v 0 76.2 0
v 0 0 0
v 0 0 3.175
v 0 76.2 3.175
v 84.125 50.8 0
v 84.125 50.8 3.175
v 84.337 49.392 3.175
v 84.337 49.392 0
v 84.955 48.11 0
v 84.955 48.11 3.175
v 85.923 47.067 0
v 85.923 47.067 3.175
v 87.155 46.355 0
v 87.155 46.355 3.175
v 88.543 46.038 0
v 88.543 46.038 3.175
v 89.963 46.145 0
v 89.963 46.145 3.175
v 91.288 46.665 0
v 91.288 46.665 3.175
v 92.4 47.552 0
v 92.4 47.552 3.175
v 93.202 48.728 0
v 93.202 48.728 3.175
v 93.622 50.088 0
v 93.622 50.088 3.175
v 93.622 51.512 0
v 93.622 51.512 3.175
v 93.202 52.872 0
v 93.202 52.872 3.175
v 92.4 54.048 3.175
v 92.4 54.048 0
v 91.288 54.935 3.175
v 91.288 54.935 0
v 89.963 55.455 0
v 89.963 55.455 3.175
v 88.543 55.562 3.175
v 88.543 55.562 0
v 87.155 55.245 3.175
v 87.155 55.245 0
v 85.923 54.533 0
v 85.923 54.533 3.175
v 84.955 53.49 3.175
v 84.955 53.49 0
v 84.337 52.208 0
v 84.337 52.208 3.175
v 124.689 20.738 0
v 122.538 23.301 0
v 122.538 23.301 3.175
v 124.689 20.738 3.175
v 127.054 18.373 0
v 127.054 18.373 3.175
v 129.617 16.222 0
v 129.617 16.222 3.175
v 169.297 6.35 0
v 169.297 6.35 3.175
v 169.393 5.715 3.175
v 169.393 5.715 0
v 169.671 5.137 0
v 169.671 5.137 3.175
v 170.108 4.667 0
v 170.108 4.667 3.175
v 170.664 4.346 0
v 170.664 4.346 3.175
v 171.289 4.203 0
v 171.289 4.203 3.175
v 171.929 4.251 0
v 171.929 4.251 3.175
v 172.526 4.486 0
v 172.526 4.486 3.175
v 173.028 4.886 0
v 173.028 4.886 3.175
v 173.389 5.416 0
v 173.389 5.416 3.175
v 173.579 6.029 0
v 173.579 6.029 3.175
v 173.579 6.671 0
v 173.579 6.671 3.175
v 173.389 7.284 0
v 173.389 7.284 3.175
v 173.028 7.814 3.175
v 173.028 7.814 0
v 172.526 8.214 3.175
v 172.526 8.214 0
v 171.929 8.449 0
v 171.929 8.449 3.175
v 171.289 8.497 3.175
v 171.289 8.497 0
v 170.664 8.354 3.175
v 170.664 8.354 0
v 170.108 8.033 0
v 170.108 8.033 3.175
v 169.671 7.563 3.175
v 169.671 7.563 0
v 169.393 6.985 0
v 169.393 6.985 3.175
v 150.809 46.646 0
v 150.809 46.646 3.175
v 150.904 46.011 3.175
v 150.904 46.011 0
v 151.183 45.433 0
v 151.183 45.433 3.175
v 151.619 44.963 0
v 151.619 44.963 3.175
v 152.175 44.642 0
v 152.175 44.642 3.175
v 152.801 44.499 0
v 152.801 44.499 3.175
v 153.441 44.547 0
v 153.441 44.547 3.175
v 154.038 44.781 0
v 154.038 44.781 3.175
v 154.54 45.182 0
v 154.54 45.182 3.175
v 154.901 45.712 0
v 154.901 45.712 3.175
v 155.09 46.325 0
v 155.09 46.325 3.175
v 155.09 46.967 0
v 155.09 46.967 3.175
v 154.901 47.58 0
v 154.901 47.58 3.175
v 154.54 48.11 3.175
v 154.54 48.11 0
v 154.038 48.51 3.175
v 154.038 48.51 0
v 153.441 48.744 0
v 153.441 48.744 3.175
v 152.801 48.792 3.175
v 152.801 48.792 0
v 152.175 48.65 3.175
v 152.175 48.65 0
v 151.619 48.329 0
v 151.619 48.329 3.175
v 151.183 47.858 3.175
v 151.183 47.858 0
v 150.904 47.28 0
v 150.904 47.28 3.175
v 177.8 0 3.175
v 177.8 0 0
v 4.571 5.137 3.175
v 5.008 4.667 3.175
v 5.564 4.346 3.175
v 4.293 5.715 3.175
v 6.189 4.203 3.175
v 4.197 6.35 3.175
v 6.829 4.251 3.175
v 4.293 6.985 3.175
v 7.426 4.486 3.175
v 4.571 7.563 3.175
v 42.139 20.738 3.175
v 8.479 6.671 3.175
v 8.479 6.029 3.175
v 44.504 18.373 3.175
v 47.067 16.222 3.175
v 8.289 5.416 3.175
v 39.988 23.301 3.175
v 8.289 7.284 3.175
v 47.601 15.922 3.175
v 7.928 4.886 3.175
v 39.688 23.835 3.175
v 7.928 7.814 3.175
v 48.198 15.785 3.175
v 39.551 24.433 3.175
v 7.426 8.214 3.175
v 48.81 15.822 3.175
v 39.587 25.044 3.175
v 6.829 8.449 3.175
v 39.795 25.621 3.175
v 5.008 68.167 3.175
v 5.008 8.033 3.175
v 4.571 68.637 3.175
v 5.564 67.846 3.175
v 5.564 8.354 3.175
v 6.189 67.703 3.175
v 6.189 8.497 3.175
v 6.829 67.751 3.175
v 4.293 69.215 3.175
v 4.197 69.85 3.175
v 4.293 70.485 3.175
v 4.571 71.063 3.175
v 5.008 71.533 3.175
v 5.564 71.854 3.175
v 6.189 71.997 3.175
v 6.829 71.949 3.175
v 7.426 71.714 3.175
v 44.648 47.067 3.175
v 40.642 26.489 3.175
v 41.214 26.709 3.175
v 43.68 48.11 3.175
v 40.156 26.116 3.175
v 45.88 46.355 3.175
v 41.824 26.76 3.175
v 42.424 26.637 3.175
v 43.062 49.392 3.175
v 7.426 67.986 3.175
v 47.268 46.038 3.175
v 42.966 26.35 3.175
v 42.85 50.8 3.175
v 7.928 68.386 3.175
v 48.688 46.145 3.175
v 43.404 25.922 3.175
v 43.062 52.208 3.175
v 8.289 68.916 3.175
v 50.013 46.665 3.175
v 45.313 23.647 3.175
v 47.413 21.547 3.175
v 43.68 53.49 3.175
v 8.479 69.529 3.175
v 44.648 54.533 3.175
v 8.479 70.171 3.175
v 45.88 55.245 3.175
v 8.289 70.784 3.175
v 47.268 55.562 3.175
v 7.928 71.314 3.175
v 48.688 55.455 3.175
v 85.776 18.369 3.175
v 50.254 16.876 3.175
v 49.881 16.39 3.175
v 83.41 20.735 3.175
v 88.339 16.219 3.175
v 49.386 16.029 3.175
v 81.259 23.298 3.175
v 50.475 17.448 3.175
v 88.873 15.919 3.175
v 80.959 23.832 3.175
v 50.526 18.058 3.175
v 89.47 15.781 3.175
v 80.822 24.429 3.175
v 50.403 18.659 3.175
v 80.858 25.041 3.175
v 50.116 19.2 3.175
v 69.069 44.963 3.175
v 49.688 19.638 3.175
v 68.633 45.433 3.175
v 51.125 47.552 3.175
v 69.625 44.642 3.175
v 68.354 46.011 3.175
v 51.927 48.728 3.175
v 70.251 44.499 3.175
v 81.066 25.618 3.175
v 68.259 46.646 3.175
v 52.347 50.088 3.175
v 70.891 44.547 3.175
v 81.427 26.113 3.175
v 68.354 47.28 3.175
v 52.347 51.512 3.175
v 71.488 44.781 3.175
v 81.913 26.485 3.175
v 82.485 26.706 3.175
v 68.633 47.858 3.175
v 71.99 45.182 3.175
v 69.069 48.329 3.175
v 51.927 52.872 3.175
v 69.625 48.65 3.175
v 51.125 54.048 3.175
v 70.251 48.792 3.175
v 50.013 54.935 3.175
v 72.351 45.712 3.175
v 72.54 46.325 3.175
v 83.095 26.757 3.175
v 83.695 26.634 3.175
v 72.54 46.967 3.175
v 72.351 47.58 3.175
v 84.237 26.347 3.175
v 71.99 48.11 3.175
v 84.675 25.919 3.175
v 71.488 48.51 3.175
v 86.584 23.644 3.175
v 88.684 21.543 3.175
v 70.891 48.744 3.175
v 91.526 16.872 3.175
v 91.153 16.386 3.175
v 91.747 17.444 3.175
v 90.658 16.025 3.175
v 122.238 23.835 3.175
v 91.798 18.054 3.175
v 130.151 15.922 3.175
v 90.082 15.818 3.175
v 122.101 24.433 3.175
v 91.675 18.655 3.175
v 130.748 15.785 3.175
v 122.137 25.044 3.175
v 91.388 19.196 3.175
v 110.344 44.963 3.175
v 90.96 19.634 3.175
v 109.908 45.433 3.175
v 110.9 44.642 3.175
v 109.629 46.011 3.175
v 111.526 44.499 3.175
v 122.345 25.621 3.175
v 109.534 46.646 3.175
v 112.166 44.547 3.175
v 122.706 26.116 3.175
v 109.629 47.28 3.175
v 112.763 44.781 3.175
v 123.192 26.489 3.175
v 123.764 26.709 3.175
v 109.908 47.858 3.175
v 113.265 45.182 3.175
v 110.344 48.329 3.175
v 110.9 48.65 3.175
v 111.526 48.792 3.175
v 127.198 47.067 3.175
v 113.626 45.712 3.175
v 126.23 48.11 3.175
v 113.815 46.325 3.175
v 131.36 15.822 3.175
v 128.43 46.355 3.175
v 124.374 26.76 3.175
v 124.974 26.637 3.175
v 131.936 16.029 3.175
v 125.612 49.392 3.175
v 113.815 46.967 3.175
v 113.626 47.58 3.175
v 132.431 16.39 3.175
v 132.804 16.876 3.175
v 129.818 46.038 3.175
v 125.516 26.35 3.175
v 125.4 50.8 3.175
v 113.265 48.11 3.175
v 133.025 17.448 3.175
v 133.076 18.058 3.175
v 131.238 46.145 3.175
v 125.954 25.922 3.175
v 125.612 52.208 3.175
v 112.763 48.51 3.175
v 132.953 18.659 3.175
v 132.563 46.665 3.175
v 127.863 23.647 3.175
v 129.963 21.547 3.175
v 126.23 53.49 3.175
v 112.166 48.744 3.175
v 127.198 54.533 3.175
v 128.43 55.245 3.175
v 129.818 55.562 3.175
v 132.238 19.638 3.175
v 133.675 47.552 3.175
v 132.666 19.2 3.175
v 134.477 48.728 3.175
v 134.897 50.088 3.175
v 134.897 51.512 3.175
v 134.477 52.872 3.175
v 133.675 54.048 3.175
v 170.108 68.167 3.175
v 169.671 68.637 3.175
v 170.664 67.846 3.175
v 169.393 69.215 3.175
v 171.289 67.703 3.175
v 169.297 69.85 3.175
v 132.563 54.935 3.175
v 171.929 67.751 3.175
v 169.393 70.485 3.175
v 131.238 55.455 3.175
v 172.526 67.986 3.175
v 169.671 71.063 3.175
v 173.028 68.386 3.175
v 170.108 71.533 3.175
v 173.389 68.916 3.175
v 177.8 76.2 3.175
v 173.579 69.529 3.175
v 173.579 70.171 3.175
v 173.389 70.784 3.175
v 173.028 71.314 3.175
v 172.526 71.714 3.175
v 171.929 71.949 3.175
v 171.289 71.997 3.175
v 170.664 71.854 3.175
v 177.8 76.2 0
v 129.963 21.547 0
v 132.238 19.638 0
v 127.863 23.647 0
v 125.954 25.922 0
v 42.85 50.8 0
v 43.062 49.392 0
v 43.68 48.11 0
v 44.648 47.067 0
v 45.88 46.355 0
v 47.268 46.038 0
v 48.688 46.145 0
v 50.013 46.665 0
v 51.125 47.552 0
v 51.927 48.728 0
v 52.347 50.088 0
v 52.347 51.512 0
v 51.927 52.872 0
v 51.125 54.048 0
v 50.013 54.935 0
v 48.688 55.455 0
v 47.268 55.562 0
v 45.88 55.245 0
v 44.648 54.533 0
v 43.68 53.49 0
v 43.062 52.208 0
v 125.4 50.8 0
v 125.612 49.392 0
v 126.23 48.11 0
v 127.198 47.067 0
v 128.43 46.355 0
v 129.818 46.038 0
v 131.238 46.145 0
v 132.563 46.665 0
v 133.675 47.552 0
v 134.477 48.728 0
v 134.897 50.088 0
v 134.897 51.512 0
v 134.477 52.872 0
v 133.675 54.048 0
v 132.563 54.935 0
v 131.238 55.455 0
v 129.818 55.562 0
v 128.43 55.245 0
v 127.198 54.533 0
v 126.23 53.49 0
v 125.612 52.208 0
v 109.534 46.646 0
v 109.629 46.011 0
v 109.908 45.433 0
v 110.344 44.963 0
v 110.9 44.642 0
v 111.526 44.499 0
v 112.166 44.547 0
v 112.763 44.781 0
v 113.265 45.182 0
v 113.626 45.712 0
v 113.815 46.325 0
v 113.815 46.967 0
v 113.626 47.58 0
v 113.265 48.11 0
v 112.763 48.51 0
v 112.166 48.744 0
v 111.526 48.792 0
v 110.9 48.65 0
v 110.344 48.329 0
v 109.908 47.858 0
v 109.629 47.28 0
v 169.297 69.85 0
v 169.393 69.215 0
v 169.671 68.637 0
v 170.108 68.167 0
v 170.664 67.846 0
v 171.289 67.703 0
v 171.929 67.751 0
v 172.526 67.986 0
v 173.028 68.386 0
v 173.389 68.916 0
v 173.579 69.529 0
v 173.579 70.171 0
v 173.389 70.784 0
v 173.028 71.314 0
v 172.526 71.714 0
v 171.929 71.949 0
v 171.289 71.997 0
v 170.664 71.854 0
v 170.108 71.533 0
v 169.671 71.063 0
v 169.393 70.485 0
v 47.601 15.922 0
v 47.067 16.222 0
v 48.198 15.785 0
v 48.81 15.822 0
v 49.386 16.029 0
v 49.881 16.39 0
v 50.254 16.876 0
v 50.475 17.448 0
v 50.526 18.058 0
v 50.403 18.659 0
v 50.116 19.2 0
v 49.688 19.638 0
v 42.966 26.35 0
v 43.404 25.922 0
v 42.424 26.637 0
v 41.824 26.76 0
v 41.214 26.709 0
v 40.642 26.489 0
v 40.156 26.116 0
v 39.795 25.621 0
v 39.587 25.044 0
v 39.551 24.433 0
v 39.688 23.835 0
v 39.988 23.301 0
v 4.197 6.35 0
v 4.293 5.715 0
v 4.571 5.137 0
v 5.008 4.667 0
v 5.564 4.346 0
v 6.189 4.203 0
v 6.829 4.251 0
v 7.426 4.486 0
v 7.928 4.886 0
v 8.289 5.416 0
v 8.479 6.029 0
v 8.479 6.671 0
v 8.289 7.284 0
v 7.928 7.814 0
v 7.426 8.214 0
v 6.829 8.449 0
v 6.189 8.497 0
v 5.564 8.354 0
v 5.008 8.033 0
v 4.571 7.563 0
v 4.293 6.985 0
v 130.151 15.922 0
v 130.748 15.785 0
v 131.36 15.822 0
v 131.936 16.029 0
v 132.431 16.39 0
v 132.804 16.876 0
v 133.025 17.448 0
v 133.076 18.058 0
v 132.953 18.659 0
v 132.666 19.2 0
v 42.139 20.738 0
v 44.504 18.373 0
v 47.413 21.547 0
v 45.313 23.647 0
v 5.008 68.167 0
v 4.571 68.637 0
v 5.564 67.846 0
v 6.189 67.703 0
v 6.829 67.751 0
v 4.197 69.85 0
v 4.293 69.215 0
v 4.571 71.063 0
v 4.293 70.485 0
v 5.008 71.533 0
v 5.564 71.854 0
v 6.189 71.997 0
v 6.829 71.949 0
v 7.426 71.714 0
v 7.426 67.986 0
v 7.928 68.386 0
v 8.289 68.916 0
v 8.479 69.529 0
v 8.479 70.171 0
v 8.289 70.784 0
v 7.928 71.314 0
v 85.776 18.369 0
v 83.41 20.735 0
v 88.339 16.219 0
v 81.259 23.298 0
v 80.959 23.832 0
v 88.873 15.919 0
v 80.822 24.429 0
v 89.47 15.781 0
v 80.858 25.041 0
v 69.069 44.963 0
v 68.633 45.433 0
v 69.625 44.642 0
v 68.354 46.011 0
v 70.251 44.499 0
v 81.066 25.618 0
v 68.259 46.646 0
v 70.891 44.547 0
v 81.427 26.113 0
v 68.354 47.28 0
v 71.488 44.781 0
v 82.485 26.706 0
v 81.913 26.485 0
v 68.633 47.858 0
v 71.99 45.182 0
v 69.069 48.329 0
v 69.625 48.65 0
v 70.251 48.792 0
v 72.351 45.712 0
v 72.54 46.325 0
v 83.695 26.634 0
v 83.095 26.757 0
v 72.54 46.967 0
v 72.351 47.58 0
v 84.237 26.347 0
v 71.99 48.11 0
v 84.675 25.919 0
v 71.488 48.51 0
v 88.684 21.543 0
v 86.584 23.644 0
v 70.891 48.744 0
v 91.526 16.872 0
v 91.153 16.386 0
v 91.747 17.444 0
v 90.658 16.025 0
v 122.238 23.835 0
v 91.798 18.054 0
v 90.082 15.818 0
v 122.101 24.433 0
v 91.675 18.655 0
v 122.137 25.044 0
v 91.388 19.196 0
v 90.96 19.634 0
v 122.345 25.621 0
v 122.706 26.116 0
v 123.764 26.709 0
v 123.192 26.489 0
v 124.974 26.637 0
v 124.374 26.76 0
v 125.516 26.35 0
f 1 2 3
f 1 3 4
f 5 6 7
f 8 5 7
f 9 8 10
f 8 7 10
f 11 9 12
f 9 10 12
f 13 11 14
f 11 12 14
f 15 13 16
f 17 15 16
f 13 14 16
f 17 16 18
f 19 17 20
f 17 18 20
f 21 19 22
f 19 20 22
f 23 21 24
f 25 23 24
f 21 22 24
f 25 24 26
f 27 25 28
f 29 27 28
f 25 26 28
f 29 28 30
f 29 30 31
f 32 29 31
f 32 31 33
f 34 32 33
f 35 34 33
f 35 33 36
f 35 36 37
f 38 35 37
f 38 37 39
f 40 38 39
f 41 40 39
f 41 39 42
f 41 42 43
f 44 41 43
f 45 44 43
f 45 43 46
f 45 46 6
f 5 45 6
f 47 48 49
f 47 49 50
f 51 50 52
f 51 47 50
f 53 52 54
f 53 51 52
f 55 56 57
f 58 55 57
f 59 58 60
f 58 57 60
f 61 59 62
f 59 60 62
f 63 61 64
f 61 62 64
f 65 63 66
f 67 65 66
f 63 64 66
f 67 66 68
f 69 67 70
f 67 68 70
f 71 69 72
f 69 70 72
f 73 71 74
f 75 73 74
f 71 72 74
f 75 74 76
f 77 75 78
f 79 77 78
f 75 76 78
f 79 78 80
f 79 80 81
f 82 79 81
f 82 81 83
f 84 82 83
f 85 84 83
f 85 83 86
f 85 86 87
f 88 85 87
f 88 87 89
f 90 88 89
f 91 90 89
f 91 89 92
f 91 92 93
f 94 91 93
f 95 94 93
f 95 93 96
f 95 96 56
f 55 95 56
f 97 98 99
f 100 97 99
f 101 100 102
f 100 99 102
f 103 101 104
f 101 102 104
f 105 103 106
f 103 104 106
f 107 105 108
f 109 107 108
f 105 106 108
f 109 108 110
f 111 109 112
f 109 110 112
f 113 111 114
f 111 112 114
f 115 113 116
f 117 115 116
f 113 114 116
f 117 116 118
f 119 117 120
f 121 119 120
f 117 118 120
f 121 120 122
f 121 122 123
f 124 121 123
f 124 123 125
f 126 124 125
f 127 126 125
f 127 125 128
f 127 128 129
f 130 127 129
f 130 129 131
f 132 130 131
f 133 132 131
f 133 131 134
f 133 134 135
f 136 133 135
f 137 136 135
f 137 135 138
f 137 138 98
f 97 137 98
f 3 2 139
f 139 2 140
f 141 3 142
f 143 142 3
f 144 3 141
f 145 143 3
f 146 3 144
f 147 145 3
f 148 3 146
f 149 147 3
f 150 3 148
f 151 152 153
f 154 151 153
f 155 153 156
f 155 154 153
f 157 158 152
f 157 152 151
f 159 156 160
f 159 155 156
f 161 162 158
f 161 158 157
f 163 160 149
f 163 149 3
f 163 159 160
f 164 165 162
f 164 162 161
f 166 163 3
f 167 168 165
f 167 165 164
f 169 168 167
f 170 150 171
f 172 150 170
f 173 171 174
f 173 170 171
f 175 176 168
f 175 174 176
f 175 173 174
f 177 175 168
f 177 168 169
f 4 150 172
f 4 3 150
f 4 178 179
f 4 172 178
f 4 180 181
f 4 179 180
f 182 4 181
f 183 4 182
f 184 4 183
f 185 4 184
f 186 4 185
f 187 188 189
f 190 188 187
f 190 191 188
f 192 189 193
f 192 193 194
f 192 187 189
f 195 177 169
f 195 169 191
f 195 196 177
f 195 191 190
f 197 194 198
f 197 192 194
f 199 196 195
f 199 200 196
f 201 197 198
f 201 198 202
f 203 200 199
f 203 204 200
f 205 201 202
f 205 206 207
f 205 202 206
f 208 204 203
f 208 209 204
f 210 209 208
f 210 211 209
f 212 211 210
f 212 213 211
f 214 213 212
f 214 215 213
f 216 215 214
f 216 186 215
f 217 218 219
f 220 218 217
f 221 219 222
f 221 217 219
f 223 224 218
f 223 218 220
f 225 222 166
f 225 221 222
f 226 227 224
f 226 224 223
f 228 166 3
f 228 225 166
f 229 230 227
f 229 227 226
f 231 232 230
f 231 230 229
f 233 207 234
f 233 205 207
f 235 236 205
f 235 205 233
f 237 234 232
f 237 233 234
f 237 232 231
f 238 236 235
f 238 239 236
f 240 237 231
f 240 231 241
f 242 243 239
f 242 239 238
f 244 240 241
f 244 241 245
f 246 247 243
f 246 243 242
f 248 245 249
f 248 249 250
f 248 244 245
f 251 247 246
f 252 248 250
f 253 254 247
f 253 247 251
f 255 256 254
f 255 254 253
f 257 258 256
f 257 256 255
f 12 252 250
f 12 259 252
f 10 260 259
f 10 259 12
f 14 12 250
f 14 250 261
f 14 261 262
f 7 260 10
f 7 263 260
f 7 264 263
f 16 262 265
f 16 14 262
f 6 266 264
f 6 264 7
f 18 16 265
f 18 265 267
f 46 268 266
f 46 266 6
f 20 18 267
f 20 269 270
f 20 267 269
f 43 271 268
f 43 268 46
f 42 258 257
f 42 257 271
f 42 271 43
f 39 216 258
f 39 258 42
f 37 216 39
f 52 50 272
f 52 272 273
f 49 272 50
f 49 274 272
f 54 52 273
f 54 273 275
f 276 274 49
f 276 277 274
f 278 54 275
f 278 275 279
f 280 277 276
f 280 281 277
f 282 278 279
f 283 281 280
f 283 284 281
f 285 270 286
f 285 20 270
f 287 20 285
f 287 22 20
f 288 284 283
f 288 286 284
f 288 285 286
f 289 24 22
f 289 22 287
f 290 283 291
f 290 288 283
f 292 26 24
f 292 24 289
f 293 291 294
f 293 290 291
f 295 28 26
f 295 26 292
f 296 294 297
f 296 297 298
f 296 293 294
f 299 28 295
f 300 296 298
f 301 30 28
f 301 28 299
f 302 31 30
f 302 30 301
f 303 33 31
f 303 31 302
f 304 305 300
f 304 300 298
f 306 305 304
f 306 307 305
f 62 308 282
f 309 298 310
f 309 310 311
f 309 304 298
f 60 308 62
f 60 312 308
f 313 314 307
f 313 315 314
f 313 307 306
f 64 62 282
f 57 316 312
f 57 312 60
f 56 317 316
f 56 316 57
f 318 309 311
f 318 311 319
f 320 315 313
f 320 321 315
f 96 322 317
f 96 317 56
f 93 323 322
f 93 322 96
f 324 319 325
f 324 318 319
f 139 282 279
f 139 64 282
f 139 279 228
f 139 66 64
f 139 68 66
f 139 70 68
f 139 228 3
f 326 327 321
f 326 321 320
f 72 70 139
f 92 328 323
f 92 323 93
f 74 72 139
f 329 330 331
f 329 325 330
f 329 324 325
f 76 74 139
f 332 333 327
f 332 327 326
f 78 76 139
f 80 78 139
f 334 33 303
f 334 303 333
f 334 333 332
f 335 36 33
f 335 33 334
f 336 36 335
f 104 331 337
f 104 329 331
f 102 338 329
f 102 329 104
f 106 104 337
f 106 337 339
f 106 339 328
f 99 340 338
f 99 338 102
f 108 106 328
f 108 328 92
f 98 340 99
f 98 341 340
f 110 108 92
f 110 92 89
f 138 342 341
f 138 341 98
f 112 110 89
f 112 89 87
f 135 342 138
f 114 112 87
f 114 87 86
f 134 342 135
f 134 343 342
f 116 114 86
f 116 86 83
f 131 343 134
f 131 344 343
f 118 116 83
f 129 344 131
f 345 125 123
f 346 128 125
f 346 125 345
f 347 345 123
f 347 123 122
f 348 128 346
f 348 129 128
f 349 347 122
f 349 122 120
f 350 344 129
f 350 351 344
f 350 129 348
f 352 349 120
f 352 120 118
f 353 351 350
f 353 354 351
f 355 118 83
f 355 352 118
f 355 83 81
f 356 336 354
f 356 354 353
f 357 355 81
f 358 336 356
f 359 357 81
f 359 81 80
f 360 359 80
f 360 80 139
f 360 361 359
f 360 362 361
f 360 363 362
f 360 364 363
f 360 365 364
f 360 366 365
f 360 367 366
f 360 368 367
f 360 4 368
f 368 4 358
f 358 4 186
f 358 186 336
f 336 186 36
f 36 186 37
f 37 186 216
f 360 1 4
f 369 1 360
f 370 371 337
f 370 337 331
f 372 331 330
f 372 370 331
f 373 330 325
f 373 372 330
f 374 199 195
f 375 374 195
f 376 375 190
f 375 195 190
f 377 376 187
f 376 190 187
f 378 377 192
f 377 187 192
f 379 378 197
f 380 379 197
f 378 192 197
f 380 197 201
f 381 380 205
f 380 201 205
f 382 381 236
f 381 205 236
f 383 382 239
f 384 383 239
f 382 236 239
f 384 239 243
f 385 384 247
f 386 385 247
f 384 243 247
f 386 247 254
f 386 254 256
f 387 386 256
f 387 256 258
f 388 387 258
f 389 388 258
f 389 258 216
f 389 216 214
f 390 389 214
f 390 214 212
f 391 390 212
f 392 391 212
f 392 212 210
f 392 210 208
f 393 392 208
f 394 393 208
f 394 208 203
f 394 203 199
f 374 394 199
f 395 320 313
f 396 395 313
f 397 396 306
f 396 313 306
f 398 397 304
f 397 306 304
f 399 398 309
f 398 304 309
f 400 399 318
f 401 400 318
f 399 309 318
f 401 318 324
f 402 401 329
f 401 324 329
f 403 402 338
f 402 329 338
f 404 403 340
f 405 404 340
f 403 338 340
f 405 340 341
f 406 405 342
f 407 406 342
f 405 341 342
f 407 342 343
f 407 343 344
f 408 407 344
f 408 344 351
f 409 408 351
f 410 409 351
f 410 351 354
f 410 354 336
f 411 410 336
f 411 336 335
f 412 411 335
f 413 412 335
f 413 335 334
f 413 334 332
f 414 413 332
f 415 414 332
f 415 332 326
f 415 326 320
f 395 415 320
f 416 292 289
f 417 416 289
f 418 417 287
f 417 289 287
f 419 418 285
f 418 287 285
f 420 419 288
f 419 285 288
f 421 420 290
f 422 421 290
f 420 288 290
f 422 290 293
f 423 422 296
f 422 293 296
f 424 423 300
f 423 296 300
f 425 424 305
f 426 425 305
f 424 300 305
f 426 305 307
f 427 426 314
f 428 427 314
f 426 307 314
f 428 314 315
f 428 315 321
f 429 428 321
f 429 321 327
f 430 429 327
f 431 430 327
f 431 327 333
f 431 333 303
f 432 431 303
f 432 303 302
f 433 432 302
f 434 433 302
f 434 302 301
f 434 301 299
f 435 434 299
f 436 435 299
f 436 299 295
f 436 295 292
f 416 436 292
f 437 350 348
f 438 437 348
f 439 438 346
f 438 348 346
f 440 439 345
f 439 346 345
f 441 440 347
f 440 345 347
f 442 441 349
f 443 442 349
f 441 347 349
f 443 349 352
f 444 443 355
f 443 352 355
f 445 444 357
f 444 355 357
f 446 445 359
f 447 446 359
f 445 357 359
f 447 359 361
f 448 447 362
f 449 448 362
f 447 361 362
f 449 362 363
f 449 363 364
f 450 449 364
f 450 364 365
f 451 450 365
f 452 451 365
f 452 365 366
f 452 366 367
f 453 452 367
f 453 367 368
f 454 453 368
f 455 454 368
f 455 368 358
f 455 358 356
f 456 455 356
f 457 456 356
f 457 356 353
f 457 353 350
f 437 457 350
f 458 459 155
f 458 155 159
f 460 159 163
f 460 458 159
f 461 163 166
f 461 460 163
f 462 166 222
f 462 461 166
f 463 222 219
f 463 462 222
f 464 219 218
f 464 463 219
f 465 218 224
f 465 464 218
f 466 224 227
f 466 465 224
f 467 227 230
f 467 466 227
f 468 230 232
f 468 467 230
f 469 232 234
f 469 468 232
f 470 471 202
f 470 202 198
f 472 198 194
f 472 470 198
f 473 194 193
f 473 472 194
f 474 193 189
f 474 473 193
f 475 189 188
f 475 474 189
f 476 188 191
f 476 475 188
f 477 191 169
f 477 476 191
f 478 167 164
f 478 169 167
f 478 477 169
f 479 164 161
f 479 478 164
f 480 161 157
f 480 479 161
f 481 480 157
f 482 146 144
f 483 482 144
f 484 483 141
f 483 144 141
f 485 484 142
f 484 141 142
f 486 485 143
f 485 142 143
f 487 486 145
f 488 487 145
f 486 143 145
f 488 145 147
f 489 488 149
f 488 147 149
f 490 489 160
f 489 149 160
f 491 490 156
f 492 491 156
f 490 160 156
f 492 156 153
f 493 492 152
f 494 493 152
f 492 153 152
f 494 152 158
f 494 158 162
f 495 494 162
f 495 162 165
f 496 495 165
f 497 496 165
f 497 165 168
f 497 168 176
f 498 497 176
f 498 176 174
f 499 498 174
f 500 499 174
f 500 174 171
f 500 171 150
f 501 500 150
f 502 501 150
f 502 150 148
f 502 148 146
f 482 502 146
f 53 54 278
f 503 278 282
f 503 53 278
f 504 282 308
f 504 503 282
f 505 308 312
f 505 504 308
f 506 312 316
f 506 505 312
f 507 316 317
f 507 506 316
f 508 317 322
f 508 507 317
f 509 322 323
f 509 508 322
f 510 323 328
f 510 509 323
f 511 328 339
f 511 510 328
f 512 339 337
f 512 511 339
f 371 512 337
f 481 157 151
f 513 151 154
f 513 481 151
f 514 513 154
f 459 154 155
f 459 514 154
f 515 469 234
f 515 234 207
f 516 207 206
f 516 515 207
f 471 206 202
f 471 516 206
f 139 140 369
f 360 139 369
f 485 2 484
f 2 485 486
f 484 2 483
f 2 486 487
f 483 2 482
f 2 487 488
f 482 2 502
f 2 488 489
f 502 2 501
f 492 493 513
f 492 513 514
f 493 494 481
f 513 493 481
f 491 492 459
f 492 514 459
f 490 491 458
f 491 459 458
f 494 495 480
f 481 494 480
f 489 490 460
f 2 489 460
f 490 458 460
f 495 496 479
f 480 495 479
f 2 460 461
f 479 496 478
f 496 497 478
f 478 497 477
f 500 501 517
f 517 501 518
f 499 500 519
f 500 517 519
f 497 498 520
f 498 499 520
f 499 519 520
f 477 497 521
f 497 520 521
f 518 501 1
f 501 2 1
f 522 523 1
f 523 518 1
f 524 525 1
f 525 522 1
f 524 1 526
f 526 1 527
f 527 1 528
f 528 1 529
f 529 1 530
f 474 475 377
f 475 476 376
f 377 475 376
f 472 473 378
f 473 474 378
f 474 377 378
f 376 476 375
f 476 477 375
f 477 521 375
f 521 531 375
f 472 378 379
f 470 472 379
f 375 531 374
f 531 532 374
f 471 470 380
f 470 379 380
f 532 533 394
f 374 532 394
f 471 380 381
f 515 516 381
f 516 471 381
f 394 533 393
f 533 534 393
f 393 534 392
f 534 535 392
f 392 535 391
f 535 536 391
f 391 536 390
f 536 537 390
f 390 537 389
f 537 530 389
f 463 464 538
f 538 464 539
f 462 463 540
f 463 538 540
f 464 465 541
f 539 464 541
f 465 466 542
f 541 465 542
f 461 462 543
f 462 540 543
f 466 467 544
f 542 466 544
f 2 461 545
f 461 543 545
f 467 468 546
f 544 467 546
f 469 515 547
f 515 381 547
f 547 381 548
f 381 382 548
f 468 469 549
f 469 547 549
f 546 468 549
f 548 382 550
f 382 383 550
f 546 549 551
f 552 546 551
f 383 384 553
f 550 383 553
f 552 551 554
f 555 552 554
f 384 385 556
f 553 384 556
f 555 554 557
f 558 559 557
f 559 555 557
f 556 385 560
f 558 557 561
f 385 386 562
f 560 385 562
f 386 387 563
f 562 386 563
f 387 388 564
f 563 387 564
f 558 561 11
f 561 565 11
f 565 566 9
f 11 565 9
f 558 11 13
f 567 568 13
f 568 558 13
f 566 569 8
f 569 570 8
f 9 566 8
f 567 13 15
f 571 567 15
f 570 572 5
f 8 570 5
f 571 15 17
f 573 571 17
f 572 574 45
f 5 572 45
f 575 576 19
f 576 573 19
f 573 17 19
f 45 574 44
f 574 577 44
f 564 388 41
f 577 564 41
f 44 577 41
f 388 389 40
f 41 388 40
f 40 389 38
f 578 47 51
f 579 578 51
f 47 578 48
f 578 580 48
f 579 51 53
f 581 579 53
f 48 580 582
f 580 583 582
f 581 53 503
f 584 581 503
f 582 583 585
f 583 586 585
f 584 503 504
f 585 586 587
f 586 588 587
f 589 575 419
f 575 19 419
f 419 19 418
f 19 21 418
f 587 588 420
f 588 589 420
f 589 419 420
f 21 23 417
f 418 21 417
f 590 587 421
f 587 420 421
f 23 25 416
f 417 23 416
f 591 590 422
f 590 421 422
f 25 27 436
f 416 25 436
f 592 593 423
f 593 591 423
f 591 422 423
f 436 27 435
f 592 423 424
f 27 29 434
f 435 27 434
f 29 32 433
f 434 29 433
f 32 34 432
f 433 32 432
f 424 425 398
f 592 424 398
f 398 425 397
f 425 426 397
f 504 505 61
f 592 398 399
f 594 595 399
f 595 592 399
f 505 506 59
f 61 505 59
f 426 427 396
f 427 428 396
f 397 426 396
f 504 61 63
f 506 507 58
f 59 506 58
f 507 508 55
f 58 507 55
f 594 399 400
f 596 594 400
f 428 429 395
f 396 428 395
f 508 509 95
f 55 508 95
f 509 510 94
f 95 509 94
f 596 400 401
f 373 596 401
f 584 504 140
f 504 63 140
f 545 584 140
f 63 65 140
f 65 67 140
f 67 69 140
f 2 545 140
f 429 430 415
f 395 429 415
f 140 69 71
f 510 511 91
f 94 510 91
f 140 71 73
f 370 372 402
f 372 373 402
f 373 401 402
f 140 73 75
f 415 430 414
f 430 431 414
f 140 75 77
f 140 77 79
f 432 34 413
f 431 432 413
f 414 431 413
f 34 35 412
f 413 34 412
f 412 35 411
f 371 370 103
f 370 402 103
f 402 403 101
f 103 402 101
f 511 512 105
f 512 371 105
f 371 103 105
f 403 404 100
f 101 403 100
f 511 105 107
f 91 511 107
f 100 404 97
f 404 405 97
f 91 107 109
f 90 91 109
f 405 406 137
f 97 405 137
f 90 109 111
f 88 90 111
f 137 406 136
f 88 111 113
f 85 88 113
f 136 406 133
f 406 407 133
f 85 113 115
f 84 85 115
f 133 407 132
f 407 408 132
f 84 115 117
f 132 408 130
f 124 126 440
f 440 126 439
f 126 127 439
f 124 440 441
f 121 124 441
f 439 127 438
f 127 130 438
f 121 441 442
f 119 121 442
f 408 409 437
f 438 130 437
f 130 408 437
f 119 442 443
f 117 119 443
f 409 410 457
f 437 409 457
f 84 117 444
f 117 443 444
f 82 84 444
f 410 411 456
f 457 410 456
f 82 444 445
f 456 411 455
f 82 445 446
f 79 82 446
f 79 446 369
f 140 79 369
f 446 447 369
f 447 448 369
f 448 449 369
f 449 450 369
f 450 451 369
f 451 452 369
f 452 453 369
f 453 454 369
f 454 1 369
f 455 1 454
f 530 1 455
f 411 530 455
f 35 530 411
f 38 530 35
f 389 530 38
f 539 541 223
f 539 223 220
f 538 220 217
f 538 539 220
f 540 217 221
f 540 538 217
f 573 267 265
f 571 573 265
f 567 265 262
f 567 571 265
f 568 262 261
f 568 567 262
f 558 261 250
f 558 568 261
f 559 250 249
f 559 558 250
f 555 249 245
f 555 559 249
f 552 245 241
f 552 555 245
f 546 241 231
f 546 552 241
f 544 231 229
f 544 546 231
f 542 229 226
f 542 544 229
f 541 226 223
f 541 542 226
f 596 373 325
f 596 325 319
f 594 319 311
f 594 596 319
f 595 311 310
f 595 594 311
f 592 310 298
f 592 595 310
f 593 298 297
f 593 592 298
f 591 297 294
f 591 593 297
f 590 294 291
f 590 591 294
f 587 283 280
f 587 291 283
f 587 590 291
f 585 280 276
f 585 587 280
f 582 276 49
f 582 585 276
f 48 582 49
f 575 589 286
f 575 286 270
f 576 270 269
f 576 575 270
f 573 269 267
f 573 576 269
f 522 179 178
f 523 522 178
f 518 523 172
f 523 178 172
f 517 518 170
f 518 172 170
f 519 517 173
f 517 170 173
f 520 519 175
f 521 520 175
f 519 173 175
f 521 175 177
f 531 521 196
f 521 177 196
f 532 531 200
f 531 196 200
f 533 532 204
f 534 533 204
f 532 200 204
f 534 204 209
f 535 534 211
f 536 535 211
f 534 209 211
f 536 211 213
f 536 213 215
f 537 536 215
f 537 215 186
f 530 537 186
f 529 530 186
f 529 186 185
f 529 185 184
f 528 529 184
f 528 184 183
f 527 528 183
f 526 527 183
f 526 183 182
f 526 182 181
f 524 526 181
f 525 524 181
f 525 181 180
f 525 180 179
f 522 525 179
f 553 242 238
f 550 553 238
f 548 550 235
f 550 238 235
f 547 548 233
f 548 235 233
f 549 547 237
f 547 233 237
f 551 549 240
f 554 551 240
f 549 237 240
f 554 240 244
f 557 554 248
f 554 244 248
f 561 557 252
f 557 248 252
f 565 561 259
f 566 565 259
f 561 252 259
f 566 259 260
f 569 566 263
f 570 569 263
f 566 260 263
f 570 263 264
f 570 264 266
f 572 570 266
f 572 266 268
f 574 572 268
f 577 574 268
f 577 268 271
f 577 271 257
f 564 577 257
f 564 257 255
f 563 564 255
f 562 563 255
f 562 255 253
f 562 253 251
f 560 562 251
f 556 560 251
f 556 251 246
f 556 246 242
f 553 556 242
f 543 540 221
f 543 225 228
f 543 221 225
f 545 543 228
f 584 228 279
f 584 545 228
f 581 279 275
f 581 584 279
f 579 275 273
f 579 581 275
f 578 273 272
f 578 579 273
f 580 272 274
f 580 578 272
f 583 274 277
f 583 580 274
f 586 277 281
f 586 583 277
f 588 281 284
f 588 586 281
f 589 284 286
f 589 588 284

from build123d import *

# Parameters (mm, degrees)
F0_W     = 177.8
F0_H     = 76.2
F3_DEPTH = 3.175
F4_DEPTH = 3.176
F5_D     = 4.3053
F6_D     = 9.5504


with BuildPart() as f3:
    # F0 (on Top) → F3 (new body)
    with BuildSketch(Plane.XY):
        with Locations((88.9, 38.1)):
            Rectangle(F0_W, F0_H)
    extrude(amount=F3_DEPTH)

    # F2 (on face) → F4 (cut, through all)
    with BuildSketch(Plane.XY):
        with BuildLine():
            ThreePointArc((47.0669316685, 16.2224972986), (50.0851940266, 16.6198590764), (49.6878322488, 19.6381214345))
            ThreePointArc((49.6878322488, 19.6381214345), (46.3399253491, 22.5741569859), (43.4038897977, 25.9220638856))
            ThreePointArc((43.4038897977, 25.9220638856), (40.3856274396, 26.3194256634), (39.9882656618, 23.3011633053))
            ThreePointArc((39.9882656618, 23.3011633053), (43.295618524, 19.5298501608), (47.0669316685, 16.2224972986))
        make_face()
        with BuildLine():
            ThreePointArc((88.3388878613, 16.2185305319), (91.3571502195, 16.6158923097), (90.9597884416, 19.6341546678))
            ThreePointArc((90.9597884416, 19.6341546678), (87.6113898152, 22.570621452), (84.674923031, 25.9190200784))
            ThreePointArc((84.674923031, 25.9190200784), (81.6566606729, 26.3163818563), (81.2592988951, 23.2981194981))
            ThreePointArc((81.2592988951, 23.2981194981), (84.5670829901, 19.5263146269), (88.3388878613, 16.2185305319))
        make_face()
        with BuildLine():
            ThreePointArc((129.6169316685, 16.2224972986), (132.6351940266, 16.6198590764), (132.2378322488, 19.6381214345))
            ThreePointArc((132.2378322488, 19.6381214345), (128.8899253491, 22.5741569859), (125.9538897977, 25.9220638856))
            ThreePointArc((125.9538897977, 25.9220638856), (122.9356274396, 26.3194256634), (122.5382656618, 23.3011633053))
            ThreePointArc((122.5382656618, 23.3011633053), (125.845618524, 19.5298501608), (129.6169316685, 16.2224972986))
        make_face()
    extrude(amount=F4_DEPTH, mode=Mode.SUBTRACT)

    # F5 (through all)
    with Locations(Plane(origin=(0, 0, 0), x_dir=(1, 0, 0), z_dir=(0, 0, -1))):
        with Locations((70.4115018816, -46.6457335184), (111.6865018816, -46.6457335184), (152.9615018816, -46.6457335184), (6.35, -69.85), (6.35, -6.35), (171.45, -69.85), (171.45, -6.35)):
            Hole(F5_D / 2)

    # F6 (through all)
    with Locations(Plane(origin=(0, 0, 0), x_dir=(1, 0, 0), z_dir=(0, 0, -1))):
        with Locations((47.625, -50.8), (88.9, -50.8), (130.175, -50.8)):
            Hole(F6_D / 2)


solid = f3.part
